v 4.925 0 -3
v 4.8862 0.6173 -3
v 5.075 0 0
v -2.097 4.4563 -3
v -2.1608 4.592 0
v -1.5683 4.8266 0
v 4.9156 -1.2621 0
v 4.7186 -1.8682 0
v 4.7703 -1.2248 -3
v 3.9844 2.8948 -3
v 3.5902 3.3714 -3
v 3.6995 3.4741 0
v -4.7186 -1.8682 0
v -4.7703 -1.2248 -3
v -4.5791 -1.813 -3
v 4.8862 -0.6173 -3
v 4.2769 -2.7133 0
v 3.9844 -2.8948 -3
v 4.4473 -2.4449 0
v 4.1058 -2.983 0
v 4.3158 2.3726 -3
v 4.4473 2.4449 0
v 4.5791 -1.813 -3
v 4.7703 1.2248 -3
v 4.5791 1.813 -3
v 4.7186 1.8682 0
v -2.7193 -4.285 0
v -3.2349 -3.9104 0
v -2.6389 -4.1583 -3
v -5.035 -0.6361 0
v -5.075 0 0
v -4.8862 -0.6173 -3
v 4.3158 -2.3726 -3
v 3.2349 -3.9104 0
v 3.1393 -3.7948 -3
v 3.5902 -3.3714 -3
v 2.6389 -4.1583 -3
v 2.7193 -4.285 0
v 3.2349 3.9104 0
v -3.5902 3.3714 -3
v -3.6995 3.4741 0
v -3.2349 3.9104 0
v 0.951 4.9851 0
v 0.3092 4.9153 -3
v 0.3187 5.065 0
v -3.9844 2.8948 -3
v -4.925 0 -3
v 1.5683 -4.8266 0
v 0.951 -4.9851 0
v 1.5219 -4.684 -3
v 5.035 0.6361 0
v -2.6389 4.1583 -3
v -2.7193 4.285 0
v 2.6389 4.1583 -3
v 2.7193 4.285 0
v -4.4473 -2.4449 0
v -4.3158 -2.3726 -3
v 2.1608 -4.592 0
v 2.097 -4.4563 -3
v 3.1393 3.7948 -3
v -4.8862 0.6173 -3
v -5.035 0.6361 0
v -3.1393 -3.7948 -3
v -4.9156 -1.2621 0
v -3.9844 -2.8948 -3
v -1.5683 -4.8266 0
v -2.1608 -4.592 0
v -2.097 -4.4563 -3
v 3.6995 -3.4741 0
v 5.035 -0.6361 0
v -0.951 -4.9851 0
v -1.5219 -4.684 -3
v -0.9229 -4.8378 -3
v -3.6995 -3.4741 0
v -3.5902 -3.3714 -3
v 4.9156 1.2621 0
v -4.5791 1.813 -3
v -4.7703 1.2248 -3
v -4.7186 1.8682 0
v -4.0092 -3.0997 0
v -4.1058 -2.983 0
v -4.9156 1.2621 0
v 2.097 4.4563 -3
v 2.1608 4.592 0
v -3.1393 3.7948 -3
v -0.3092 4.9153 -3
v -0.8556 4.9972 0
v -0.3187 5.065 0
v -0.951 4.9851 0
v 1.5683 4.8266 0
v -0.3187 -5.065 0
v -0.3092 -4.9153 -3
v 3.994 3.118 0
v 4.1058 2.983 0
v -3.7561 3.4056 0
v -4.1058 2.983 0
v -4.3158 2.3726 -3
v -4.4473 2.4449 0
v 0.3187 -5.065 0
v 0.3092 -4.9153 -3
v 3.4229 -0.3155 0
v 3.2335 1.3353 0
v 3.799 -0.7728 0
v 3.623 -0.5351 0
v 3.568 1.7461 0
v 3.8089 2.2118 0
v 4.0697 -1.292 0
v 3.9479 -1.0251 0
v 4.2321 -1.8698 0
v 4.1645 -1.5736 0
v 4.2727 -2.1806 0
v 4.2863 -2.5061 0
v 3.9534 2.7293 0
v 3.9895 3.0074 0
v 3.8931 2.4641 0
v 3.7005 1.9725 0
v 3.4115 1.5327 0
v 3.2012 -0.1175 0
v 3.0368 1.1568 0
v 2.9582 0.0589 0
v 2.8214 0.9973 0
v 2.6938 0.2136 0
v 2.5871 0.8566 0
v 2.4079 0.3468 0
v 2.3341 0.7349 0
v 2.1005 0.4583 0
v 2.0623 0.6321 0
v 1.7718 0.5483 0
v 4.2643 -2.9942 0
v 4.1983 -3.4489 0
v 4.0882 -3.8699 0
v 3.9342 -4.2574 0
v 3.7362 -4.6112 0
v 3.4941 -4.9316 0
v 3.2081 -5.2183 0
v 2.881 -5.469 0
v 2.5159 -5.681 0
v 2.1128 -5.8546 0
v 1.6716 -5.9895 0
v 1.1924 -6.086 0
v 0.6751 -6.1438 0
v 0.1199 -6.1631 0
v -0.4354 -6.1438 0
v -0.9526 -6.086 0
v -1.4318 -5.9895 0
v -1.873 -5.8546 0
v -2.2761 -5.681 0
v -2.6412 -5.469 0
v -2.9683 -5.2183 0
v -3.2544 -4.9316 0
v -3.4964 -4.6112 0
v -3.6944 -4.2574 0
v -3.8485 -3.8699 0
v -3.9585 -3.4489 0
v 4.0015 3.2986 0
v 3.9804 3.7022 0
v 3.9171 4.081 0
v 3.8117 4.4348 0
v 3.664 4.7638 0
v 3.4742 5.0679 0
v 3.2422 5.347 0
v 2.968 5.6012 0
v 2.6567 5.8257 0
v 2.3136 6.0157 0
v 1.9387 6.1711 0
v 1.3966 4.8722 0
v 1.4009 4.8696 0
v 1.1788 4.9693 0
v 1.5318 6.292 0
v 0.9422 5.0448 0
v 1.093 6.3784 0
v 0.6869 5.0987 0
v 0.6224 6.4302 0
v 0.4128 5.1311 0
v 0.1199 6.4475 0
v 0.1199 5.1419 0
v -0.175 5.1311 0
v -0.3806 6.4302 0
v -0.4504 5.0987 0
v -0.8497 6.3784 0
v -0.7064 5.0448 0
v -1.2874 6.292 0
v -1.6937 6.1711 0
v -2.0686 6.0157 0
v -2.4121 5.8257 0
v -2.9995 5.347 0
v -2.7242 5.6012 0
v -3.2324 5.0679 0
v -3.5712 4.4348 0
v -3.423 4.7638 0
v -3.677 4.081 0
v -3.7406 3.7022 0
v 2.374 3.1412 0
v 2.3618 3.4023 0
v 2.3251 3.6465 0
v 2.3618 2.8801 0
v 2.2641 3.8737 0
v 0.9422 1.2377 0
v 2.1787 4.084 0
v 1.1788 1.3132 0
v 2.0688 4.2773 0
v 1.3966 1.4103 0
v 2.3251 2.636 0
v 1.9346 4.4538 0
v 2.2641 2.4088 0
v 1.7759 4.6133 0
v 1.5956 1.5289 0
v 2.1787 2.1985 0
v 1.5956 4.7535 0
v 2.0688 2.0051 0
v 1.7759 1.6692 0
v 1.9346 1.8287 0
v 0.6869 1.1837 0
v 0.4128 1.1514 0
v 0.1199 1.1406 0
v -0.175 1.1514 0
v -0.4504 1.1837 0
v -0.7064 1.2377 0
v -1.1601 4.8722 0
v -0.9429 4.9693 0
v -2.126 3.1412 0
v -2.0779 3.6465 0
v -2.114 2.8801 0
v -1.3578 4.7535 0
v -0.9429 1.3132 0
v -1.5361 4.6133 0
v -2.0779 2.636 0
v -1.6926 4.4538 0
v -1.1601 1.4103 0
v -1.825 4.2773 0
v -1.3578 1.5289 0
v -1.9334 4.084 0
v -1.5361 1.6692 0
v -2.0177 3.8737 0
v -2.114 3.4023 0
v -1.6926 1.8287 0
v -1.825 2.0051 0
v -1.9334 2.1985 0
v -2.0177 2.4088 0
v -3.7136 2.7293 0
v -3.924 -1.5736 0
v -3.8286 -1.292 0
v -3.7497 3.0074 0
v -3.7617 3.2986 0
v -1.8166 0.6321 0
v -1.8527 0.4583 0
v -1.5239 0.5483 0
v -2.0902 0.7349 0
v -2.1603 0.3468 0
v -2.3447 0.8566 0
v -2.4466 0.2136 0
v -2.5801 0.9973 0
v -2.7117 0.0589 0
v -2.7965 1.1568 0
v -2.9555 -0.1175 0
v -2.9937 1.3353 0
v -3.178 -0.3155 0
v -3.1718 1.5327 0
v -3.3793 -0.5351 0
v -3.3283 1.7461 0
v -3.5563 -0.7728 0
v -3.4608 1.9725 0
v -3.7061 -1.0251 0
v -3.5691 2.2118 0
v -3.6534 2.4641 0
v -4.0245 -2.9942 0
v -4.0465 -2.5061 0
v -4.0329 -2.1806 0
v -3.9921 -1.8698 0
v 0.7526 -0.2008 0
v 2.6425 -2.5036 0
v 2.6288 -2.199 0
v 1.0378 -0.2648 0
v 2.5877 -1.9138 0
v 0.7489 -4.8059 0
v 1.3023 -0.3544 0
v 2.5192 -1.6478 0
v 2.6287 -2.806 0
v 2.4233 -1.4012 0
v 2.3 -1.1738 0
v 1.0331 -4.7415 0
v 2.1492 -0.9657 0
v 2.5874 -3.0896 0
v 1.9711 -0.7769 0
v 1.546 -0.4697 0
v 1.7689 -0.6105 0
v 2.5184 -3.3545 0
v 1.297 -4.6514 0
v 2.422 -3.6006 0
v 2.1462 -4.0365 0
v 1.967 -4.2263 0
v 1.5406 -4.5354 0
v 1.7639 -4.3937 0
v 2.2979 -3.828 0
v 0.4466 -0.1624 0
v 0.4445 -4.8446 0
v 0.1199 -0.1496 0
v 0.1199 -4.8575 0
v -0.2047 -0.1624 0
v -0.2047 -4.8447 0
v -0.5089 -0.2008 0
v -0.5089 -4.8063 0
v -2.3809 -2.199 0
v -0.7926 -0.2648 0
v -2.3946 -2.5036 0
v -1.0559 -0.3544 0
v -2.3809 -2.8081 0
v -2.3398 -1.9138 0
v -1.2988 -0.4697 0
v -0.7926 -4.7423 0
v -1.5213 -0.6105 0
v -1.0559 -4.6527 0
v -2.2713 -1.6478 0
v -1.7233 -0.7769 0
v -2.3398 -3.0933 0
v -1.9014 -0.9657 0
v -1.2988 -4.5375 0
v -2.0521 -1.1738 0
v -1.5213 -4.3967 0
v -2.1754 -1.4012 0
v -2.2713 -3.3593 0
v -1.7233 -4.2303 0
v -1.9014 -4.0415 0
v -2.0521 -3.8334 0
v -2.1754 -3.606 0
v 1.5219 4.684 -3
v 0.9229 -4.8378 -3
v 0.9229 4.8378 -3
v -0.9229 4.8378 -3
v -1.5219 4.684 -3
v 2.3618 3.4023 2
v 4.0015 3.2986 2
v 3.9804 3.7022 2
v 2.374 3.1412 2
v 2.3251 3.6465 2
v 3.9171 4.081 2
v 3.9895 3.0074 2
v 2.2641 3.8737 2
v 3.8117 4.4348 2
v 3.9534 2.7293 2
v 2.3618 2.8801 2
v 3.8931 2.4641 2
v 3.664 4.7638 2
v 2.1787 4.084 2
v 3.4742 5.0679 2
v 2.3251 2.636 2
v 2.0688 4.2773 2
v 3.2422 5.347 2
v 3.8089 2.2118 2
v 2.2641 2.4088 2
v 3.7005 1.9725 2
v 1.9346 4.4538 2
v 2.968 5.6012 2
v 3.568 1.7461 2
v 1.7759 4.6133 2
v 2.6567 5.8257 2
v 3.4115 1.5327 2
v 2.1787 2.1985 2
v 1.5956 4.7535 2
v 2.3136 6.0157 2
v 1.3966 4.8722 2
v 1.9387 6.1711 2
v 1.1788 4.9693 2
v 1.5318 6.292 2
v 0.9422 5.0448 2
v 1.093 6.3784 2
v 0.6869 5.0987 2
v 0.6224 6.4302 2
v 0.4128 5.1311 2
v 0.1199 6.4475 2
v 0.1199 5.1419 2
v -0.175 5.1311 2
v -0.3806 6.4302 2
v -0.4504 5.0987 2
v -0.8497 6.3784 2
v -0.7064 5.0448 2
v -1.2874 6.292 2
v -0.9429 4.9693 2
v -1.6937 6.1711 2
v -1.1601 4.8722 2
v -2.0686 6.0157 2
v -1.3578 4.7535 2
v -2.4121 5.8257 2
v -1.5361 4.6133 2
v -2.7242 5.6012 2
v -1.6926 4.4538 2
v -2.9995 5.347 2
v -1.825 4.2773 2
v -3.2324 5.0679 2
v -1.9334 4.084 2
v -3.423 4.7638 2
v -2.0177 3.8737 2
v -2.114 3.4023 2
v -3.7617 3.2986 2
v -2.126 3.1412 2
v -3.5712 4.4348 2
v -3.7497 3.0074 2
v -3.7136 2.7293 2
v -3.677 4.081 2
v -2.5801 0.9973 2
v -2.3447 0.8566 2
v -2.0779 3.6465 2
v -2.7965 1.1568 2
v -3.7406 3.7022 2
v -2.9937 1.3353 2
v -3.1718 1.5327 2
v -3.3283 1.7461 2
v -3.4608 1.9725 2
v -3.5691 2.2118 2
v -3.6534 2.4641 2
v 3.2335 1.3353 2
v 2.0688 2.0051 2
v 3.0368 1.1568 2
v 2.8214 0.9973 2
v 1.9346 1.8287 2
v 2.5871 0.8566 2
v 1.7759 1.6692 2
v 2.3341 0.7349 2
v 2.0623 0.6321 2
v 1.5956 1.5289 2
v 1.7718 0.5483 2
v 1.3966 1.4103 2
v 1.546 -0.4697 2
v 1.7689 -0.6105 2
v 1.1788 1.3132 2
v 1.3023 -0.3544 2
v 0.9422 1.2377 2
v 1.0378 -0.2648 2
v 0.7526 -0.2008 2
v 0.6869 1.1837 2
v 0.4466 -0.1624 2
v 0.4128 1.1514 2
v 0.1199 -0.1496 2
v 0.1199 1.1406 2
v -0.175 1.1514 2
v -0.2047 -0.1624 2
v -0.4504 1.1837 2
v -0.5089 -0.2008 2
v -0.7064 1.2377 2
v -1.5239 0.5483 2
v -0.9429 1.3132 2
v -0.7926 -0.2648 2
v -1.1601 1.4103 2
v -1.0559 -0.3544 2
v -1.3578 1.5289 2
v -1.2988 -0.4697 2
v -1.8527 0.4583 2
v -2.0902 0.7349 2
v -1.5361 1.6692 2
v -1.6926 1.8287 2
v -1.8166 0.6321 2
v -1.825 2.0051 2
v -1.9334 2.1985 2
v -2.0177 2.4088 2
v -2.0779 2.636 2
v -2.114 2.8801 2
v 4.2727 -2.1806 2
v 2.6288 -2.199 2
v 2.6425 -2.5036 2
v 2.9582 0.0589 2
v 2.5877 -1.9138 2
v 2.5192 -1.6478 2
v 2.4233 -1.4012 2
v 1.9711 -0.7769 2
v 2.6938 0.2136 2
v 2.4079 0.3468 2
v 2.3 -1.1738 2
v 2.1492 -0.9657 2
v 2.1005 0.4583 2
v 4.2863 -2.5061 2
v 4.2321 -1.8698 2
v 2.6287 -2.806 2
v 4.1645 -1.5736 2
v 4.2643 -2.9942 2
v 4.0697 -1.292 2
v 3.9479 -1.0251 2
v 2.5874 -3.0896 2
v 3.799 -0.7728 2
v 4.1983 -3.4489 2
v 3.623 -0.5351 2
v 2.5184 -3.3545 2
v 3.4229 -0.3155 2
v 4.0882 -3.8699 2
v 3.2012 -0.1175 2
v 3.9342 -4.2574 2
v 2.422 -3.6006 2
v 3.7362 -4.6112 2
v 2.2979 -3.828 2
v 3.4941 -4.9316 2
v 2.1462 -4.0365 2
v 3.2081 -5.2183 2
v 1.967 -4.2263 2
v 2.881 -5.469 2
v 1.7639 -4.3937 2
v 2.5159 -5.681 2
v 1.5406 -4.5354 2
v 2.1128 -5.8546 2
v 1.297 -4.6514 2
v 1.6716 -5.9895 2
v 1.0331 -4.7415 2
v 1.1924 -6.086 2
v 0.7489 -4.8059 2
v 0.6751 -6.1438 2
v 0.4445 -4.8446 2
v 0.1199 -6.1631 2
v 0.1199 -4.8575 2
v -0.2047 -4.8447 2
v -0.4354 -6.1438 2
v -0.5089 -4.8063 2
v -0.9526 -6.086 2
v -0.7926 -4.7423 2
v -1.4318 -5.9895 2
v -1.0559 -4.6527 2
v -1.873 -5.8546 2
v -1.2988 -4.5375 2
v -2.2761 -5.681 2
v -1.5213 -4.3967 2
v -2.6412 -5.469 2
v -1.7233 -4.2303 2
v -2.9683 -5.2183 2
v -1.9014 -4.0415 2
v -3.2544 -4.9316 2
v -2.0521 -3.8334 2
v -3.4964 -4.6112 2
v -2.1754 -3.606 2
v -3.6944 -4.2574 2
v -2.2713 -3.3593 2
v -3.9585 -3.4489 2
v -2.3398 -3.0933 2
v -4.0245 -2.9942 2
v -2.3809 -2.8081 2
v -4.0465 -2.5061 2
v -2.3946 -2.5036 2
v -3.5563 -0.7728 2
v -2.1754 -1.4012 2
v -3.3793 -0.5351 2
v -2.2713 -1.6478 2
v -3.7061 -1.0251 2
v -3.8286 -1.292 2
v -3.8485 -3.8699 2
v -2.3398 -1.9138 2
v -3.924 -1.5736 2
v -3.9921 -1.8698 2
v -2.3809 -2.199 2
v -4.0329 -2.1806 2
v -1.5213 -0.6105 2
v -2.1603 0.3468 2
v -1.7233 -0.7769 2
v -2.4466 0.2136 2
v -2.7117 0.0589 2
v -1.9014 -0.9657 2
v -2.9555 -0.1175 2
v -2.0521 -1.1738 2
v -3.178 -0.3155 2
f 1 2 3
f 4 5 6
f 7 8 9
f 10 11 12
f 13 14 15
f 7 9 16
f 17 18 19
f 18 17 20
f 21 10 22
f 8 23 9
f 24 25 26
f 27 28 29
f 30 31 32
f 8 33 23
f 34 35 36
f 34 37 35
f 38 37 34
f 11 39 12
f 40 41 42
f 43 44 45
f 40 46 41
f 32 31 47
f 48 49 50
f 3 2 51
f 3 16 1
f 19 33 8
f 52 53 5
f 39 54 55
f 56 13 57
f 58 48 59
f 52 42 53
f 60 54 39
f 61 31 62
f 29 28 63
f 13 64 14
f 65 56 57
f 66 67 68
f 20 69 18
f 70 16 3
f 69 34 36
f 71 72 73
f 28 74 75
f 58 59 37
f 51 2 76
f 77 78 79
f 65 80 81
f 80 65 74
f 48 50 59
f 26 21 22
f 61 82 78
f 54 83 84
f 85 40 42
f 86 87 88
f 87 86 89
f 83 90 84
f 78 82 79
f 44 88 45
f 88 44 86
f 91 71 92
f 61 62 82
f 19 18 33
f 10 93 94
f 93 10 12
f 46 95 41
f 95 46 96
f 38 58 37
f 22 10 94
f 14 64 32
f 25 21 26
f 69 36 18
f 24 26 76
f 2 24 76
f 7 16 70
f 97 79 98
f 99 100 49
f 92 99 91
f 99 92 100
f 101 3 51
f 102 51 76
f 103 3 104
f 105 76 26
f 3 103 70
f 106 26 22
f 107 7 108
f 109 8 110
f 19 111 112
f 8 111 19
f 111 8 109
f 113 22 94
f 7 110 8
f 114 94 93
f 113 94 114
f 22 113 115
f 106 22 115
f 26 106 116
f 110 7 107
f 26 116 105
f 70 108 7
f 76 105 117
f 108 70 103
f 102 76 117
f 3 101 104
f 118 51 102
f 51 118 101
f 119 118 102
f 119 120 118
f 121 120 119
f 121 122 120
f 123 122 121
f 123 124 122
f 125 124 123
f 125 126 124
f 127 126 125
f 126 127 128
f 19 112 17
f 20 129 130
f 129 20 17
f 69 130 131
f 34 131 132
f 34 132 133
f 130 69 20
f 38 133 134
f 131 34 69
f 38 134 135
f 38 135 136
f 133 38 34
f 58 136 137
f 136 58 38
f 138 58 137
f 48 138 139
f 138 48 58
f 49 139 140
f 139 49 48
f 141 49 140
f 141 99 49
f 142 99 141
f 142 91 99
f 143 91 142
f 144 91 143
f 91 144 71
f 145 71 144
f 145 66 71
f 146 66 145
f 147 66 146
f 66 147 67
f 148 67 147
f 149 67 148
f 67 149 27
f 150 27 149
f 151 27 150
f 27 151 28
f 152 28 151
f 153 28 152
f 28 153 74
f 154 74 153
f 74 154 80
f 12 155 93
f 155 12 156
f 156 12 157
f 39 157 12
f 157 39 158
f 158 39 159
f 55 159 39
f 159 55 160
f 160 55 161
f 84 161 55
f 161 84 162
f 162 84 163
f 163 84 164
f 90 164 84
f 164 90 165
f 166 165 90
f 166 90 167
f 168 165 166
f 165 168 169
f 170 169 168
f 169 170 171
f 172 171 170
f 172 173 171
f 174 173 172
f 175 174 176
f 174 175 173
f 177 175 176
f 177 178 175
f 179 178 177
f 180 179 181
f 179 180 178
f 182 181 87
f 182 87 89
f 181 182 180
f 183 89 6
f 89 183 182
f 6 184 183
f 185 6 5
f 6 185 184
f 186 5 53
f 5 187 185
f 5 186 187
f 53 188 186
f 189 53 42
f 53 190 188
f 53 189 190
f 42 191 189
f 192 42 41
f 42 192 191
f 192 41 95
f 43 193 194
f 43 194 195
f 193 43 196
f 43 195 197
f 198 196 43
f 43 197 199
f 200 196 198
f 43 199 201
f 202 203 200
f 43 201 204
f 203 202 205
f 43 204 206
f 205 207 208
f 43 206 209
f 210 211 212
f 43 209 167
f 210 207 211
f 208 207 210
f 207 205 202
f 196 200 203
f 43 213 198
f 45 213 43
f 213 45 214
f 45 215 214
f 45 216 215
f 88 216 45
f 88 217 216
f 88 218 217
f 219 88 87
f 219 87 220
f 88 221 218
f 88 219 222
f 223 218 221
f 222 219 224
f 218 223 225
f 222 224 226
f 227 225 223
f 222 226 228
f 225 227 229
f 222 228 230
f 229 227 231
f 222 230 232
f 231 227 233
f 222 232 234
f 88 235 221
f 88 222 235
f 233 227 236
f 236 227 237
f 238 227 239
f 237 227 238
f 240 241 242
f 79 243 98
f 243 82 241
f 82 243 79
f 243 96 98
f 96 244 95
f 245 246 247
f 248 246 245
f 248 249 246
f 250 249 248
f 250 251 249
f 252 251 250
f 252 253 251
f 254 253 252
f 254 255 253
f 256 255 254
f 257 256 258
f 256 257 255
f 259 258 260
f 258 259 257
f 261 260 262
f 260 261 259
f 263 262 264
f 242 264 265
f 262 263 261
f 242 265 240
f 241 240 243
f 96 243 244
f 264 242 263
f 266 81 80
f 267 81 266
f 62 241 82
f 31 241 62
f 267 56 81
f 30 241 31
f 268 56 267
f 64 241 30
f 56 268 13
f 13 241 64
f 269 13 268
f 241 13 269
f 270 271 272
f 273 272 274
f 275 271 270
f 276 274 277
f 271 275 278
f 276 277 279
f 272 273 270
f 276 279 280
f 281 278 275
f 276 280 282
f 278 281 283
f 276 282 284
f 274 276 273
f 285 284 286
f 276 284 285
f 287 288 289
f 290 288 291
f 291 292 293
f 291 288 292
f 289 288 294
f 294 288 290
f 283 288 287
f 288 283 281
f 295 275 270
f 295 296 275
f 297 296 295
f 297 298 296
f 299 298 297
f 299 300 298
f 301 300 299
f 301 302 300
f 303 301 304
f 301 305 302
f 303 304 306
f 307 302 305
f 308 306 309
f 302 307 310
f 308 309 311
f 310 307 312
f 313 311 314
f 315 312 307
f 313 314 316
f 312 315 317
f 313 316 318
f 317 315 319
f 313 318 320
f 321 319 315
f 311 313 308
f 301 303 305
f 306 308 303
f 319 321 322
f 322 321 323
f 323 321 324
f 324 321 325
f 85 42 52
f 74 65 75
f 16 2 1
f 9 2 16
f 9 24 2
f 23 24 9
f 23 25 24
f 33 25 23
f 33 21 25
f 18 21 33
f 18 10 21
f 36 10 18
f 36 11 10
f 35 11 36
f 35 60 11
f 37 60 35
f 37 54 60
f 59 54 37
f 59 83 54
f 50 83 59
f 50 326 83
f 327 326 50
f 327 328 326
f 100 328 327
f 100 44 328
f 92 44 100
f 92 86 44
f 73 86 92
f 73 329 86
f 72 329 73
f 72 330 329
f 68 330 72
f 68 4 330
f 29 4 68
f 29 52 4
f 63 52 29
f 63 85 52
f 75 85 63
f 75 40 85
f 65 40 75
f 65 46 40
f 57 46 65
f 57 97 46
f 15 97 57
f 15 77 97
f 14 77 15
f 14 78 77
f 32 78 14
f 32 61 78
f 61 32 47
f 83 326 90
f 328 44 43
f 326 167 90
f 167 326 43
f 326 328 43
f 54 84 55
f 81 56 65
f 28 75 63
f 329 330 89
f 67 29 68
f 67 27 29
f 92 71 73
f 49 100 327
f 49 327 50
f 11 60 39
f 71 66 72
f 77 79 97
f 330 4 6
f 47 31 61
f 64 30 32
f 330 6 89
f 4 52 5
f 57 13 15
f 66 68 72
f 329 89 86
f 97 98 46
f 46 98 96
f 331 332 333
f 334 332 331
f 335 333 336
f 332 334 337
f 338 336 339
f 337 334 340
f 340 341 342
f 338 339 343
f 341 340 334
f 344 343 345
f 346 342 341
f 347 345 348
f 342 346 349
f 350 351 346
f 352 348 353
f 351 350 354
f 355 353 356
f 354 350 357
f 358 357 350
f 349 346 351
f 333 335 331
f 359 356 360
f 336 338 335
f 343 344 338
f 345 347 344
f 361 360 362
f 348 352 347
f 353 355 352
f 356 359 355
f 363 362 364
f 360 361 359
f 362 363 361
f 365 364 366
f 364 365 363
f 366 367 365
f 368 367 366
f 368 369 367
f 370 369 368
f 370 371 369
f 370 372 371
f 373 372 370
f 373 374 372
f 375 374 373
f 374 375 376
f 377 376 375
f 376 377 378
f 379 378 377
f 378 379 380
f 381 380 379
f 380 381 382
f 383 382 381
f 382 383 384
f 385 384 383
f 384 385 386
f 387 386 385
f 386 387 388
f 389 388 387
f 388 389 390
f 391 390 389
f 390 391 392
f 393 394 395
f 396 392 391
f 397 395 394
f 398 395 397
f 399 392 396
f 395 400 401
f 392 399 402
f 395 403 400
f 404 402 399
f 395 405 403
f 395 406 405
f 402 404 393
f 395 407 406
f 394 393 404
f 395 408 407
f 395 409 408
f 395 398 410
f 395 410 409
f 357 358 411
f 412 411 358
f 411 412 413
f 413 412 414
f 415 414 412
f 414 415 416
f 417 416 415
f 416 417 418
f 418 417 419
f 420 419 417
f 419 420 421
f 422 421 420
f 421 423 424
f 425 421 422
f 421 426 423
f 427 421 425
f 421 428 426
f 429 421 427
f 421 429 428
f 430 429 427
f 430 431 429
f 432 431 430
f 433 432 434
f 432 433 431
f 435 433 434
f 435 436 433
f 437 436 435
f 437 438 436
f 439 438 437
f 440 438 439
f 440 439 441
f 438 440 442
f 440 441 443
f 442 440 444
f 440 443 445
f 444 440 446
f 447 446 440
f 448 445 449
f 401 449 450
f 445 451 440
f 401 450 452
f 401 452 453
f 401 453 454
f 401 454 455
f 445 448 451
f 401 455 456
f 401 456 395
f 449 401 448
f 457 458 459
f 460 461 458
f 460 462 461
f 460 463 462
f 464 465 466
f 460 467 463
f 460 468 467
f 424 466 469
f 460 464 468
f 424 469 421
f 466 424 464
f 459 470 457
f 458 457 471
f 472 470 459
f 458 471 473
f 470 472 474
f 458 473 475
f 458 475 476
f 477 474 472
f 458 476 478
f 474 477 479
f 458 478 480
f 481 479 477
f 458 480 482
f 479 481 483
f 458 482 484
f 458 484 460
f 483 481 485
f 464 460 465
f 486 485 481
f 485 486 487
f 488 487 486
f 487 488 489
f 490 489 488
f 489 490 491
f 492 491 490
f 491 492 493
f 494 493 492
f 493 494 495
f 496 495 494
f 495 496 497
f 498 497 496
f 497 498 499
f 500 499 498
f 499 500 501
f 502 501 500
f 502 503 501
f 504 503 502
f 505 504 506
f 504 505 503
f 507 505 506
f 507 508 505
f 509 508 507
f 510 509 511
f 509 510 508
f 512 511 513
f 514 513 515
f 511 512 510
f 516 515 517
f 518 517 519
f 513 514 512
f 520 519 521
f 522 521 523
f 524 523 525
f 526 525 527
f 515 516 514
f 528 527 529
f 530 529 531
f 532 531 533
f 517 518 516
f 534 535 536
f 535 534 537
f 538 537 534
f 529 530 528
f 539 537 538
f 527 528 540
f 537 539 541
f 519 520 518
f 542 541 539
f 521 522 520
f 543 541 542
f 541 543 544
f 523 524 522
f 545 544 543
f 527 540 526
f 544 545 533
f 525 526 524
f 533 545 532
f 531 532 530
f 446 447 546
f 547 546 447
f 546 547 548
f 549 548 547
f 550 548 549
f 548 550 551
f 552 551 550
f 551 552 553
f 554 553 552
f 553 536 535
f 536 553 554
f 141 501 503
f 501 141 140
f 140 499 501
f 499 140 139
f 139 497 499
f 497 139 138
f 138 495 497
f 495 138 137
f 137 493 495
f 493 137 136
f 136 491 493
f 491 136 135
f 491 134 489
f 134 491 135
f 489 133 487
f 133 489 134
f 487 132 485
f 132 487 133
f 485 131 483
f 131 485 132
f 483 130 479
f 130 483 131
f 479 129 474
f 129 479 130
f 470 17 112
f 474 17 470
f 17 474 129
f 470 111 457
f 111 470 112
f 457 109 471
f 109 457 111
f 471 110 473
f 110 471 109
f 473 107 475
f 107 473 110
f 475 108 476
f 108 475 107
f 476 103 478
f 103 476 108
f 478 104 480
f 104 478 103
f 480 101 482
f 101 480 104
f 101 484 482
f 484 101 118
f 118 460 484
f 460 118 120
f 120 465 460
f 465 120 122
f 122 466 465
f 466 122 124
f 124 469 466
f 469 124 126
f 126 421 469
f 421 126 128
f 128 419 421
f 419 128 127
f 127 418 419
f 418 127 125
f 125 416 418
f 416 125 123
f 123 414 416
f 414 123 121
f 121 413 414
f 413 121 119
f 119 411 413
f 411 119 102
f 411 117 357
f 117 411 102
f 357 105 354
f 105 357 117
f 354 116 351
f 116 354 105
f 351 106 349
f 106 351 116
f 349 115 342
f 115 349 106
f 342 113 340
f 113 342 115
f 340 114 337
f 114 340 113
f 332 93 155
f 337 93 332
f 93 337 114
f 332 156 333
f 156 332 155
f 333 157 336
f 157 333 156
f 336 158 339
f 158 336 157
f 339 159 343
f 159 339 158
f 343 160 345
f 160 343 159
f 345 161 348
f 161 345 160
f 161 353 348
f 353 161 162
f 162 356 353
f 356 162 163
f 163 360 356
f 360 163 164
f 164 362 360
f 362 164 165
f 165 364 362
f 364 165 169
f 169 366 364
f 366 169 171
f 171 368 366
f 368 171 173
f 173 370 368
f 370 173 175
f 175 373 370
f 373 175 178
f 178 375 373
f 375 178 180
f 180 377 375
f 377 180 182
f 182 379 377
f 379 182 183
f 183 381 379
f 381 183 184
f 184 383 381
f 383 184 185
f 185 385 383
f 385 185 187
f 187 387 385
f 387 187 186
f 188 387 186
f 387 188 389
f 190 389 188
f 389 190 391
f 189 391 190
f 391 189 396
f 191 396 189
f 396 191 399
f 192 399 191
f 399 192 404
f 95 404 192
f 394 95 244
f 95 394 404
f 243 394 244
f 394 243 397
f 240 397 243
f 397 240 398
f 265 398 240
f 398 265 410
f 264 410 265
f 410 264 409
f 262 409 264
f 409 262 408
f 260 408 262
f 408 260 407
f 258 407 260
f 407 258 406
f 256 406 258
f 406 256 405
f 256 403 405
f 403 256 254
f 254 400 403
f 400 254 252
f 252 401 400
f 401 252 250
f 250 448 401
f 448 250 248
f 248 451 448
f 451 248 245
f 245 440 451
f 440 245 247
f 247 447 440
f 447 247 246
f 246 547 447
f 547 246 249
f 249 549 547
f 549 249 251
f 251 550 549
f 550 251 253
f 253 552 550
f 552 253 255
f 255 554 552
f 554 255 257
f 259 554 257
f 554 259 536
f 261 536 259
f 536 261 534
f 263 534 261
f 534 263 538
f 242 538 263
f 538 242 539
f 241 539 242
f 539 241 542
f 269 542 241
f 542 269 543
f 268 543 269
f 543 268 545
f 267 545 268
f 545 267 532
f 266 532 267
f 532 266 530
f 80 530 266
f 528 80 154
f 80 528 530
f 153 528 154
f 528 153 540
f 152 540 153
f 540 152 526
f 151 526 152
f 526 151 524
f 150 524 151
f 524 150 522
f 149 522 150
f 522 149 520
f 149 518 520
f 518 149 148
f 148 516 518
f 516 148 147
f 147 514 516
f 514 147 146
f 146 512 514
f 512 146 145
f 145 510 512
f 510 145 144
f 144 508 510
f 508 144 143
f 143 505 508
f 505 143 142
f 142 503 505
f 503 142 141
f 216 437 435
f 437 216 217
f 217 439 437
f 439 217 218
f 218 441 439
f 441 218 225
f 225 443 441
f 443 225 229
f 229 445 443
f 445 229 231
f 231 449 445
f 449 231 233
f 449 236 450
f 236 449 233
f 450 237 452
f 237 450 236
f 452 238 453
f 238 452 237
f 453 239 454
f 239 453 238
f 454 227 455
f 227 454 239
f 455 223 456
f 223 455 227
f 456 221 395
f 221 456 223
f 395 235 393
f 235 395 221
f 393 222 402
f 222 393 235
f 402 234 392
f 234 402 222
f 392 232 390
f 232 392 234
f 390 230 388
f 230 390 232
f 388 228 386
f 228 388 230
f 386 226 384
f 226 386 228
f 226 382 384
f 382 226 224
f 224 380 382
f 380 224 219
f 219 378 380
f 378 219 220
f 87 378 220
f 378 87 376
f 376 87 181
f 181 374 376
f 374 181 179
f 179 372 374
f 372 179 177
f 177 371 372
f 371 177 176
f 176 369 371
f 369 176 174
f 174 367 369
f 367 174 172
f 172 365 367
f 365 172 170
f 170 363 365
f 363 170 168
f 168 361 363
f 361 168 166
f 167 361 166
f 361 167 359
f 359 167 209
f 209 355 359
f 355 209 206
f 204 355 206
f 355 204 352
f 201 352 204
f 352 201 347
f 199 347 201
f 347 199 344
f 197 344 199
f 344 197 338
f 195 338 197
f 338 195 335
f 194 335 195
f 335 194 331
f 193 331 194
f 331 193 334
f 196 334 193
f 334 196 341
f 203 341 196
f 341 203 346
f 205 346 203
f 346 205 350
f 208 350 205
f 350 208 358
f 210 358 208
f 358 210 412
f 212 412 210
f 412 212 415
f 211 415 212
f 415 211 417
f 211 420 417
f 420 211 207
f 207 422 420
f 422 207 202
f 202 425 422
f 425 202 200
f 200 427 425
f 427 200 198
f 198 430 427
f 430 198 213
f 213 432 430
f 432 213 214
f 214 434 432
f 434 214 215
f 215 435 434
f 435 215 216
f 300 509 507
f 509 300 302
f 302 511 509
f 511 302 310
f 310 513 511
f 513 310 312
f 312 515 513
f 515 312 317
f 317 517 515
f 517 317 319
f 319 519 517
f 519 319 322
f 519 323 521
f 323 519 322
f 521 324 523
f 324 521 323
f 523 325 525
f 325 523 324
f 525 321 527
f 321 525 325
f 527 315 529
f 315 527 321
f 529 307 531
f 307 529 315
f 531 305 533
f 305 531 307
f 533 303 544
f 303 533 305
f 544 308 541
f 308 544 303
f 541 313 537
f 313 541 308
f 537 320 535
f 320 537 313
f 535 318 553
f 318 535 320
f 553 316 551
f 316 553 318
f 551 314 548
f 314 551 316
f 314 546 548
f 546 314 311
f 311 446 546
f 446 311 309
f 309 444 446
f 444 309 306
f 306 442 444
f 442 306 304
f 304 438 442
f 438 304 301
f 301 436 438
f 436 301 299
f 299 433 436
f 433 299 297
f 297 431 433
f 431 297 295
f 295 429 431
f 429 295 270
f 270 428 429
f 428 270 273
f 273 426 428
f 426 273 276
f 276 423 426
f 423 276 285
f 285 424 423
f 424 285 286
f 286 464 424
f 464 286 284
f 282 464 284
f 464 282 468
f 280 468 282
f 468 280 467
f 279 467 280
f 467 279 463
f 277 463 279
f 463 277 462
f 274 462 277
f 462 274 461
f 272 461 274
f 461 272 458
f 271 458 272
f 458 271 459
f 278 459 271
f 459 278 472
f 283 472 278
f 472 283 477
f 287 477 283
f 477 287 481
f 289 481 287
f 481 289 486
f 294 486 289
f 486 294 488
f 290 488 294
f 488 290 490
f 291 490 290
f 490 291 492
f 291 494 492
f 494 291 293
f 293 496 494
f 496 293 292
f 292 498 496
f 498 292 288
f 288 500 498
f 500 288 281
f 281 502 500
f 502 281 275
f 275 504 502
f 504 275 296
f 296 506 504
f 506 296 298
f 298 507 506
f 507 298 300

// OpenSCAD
$fn = 50;


difference() {
	union() {
		translate(v = [0, 0, -3.0000000000]) {
			cylinder(h = 3, r1 = 4.9250000000, r2 = 5.0750000000);
		}
		linear_extrude(height = 2) {
			text(font = "Impact", halign = "center", size = 12, text = "8", valign = "center");
		}
	}
	union();
}
